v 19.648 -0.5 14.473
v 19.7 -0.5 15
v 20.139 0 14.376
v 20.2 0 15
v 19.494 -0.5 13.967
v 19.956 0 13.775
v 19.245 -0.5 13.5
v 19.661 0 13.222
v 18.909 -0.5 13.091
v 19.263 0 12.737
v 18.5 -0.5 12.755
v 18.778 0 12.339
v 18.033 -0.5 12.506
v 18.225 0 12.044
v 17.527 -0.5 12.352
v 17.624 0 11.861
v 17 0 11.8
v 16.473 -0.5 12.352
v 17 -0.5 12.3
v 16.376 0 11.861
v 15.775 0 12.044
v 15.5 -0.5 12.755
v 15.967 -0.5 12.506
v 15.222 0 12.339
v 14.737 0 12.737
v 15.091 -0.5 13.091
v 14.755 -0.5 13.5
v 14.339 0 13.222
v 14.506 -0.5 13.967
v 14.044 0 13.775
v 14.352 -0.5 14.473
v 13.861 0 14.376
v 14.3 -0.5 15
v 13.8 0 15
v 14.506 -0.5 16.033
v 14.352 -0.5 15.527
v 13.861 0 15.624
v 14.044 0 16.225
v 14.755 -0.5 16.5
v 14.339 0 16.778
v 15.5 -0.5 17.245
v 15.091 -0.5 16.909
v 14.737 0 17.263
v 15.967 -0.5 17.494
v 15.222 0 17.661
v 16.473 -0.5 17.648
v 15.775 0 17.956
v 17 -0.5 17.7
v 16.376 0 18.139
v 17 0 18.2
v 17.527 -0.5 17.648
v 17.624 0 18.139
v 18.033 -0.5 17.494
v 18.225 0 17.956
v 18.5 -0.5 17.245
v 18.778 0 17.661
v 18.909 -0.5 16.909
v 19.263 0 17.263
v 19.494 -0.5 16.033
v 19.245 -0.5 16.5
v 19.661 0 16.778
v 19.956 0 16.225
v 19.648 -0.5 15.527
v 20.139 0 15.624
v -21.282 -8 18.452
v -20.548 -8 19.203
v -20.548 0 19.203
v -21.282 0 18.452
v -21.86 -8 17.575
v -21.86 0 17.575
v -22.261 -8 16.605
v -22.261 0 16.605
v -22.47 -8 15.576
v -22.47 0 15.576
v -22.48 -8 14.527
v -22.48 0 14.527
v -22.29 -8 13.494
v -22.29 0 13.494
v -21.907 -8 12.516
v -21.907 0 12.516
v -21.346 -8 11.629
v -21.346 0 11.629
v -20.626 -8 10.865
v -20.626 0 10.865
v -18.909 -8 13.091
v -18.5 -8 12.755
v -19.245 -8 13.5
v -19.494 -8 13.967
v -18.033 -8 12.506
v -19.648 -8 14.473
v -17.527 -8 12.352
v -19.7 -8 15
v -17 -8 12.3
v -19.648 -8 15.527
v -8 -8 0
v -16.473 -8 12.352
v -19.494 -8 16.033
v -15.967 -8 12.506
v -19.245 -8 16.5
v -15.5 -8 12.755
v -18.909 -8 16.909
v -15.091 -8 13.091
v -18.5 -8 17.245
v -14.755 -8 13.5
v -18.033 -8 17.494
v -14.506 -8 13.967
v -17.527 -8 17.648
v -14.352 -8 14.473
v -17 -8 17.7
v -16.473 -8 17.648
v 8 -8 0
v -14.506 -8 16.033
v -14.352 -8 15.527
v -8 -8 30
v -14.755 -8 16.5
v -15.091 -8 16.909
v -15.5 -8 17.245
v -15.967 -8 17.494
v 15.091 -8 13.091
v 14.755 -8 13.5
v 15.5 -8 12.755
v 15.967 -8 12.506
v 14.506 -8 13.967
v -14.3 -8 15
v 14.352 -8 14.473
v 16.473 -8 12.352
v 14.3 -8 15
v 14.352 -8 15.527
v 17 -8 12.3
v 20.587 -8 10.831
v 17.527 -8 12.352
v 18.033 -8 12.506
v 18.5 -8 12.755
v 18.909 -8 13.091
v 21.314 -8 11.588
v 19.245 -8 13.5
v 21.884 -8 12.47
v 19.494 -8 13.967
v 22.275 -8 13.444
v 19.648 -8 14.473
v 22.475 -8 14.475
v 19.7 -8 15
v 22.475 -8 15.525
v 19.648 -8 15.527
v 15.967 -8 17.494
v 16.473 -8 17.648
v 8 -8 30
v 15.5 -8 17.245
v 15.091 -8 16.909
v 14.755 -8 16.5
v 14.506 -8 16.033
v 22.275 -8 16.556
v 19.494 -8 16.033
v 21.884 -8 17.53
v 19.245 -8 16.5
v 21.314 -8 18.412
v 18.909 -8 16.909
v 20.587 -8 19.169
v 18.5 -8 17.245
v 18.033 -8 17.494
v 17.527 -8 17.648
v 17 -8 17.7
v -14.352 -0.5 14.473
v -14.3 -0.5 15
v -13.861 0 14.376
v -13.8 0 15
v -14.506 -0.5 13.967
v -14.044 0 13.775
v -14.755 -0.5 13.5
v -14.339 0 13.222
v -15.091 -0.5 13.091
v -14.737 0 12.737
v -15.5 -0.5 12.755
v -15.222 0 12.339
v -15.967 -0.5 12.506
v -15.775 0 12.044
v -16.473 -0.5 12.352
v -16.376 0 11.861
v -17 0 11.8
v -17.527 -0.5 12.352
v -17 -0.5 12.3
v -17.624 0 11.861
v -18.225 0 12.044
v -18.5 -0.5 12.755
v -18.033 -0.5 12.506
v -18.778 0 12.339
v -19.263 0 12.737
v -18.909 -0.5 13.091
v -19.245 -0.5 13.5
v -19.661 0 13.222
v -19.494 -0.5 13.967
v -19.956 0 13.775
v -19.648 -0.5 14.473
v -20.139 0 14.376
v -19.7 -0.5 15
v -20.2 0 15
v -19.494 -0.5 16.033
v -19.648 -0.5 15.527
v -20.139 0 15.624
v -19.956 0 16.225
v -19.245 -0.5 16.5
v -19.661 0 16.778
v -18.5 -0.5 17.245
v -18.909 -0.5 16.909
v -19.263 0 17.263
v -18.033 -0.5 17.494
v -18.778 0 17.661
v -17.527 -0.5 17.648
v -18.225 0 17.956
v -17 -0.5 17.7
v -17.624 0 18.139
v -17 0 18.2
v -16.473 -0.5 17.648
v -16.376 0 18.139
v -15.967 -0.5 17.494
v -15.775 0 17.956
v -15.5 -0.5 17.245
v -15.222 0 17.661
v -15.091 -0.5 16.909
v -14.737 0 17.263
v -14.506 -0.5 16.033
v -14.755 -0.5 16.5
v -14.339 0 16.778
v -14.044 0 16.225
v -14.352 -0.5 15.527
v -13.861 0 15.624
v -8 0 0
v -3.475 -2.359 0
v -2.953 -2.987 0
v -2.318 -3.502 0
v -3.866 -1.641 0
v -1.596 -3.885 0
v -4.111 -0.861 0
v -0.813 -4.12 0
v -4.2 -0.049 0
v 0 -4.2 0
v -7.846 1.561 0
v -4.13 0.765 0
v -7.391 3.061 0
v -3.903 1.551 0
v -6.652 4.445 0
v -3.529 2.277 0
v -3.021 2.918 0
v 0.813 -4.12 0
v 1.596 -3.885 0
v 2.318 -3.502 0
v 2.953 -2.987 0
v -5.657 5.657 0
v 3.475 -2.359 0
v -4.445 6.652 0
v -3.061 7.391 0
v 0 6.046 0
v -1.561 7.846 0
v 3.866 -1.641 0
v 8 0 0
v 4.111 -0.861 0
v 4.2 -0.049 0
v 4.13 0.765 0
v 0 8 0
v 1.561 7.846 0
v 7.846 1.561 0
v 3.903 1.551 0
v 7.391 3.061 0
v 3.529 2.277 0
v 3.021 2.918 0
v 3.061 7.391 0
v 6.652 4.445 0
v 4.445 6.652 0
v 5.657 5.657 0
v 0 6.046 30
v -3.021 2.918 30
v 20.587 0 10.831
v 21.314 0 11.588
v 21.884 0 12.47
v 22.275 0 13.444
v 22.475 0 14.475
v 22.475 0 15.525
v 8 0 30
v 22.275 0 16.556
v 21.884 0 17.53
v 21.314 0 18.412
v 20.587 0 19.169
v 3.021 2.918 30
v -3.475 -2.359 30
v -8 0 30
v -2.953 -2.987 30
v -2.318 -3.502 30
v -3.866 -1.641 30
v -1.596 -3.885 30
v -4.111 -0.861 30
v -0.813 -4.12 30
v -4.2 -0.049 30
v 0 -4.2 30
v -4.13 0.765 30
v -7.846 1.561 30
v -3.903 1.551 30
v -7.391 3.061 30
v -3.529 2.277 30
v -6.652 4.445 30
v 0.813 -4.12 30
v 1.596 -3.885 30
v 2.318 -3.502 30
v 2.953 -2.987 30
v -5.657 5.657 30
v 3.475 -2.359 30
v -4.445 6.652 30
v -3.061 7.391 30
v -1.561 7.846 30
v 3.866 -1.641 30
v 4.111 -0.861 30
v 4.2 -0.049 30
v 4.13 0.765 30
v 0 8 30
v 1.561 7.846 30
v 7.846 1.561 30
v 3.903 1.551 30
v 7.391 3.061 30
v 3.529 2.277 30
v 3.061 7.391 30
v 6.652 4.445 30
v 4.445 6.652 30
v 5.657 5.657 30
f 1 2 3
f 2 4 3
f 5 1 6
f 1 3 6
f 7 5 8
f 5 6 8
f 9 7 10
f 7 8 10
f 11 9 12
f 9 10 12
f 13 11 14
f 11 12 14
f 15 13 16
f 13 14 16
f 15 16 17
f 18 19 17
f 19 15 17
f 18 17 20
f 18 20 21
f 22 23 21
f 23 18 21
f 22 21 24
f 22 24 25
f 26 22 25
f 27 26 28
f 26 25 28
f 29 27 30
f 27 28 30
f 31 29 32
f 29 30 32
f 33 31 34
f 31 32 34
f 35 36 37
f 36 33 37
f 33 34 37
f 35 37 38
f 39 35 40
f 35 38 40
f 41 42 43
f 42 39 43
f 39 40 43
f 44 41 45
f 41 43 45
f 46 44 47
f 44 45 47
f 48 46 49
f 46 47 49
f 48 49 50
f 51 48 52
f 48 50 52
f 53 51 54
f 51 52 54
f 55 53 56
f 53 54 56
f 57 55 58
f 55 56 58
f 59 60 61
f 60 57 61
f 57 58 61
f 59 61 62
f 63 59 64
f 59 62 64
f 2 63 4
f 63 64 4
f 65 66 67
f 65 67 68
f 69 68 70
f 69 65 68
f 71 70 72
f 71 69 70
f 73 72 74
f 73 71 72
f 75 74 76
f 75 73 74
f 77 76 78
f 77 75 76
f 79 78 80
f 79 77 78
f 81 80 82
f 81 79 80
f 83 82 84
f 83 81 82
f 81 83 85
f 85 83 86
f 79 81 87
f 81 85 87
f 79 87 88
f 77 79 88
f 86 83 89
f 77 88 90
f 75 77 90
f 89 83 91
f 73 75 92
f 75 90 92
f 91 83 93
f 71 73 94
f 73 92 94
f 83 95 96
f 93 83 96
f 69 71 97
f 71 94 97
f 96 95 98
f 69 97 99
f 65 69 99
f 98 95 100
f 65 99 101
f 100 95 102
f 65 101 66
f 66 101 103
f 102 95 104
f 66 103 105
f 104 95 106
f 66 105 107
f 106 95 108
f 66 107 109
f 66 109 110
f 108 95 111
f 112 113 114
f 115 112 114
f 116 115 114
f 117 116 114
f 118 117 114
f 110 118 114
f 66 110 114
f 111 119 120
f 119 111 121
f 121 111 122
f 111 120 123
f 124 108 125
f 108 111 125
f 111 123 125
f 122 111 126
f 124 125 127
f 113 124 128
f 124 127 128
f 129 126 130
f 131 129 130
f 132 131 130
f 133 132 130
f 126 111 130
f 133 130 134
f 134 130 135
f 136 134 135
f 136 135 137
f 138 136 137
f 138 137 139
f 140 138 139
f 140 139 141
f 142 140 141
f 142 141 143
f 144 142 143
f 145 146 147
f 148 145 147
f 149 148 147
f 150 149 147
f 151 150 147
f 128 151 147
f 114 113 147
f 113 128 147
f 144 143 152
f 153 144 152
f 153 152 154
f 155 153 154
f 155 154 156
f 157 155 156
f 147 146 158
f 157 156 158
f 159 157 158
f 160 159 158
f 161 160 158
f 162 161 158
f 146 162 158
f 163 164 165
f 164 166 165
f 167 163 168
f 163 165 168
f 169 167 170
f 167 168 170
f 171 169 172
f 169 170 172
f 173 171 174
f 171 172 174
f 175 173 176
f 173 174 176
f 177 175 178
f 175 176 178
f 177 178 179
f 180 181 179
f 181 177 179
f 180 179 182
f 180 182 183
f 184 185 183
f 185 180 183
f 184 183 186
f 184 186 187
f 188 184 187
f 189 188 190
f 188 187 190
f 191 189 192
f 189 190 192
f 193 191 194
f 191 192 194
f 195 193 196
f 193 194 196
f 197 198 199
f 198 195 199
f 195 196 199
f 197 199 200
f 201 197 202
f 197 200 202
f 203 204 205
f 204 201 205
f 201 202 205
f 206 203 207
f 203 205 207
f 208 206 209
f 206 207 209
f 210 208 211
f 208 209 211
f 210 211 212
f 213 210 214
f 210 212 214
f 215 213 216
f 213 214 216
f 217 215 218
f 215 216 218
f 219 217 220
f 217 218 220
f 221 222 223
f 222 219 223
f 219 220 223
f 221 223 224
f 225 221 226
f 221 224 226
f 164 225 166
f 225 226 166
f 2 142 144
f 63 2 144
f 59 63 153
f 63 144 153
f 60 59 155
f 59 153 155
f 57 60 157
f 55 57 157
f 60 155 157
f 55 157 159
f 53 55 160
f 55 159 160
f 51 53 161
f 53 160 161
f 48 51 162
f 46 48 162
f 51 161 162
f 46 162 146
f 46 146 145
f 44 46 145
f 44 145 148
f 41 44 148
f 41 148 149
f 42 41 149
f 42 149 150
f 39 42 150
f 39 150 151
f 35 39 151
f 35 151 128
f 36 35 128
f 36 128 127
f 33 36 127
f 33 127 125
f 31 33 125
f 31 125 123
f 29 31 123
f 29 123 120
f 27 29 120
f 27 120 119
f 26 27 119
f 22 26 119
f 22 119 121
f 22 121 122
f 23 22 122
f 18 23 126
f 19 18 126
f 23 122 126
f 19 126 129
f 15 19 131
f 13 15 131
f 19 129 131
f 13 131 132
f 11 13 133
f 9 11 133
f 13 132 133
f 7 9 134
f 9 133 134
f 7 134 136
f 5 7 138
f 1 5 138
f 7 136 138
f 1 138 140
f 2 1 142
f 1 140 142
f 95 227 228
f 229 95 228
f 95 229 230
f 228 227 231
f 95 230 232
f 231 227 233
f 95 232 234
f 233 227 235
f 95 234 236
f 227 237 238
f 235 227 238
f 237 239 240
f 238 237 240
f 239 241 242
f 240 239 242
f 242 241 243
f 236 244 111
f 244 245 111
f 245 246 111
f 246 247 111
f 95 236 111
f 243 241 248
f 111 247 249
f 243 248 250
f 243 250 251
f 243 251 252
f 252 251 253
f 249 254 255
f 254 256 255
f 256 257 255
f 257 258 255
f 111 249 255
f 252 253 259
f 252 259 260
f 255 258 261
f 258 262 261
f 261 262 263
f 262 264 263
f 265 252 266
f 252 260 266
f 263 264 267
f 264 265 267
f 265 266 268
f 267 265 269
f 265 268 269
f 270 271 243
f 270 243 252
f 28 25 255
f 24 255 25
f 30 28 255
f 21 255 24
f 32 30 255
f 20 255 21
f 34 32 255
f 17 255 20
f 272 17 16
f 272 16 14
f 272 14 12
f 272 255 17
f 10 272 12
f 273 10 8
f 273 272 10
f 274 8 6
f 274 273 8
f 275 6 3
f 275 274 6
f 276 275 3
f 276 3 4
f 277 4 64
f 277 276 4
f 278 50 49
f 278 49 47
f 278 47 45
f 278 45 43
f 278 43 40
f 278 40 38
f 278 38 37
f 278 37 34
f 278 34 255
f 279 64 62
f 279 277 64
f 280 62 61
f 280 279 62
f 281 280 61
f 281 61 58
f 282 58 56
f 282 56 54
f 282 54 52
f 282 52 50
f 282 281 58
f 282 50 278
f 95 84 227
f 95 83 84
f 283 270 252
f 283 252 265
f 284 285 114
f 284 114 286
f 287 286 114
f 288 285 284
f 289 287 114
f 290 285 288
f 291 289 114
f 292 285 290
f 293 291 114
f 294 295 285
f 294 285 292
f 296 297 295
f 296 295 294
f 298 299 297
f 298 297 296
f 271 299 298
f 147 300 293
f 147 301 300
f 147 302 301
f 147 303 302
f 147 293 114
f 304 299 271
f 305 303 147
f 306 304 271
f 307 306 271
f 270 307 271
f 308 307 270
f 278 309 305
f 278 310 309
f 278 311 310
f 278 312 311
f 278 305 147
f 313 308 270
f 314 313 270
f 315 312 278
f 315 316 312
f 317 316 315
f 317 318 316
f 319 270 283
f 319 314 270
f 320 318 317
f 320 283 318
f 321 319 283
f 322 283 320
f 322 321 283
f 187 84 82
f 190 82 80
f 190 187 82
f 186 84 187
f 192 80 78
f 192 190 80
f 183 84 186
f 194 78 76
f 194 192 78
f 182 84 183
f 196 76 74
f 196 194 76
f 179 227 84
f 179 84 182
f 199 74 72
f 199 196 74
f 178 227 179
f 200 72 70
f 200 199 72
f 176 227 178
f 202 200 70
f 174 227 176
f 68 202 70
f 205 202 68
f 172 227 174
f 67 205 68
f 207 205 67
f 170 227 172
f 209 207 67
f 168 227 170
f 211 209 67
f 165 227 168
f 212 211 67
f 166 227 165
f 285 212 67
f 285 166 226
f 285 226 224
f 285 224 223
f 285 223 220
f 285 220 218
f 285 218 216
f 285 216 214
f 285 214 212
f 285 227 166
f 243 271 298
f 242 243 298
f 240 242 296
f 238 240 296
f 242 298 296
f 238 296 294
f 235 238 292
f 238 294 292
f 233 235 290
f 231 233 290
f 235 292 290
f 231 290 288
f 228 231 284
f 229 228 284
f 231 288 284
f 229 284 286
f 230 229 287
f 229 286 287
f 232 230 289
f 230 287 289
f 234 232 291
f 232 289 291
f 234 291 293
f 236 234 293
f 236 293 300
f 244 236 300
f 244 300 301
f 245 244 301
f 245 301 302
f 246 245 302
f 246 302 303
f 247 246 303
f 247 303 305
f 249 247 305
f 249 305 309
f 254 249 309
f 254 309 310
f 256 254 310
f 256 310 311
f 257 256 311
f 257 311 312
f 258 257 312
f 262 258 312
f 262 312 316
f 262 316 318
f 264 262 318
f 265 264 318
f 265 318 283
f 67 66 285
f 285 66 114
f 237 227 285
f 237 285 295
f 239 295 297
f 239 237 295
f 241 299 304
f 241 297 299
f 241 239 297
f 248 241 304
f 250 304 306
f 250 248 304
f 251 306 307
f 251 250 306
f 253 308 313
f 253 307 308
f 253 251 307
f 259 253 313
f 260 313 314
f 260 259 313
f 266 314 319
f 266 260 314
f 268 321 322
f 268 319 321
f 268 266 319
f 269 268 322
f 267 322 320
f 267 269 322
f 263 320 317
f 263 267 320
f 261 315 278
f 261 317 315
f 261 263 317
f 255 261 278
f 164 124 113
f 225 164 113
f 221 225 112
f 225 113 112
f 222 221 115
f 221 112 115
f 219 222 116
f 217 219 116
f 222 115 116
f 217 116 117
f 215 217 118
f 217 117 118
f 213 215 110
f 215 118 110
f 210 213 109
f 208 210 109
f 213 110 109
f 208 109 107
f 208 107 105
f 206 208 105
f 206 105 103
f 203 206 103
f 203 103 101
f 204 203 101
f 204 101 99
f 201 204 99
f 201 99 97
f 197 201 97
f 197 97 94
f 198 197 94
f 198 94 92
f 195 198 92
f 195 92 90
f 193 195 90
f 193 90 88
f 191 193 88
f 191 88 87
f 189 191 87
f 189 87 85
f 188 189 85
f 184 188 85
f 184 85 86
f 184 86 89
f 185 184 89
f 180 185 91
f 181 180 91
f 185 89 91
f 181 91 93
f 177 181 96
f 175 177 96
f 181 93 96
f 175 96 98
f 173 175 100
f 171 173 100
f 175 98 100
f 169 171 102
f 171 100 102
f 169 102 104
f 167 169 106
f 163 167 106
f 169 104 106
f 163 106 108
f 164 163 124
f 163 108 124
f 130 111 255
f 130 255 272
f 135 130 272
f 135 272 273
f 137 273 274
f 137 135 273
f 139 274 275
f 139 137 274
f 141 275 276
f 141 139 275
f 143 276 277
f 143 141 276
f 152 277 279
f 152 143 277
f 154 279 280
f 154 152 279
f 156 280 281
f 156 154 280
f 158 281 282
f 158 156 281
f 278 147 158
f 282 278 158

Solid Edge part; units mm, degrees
sketch "Sketch1" plane through (0, 0, 0) normal (0, 0, 1) x (1, 0, 0)
  circle A0 centre (0, 0) radius 4.1
  circle A1 centre (0, 0) radius 8
extrude "Protrusion1" add sketch "Sketch1" along normal blind 30
sketch "Sketch2" plane through (0, -8, 0) normal (0, -1, 0) x (1, 0, 0)
  arc A0 (-20.6265, 10.8649) -> (-20.548, 19.2026) centre (-17, 15) cw
  line L0 (-20.548, 19.2026) -> (-8, 30)
  line L1 (-8, 30) -> (8, 30)
  line L2 (8, 30) -> (20.5873, 19.1691)
  arc A1 (20.5873, 10.8309) -> (20.5873, 19.1691) centre (17, 15) ccw
  line L3 (8, 0) -> (20.5873, 10.8309)
  line L4 (8, 0) -> (-8, 0)
  line L5 (-20.6265, 10.8649) -> (-8, 0)
  circle A2 centre (-17, 15) radius 2.7
  circle A3 centre (17, 15) radius 2.7
  dimension "D1" = 17
extrude "Protrusion2" add sketch "Sketch2" against normal up to vertex (8 mm away)
sketch "Sketch3" plane through (0, 0, 30) normal (0, 0, 1) x (0, 1, 0)
  circle A0 centre (0, 0) radius 4.2
extrude "Cutout1" cut sketch "Sketch3" against normal through all
sketch "Sketch4" plane through (0, 0, 0) normal (0, 0, -1) x (-1, 0, 0)
  line L0 (0, 0) -> (3.0212, 2.9176)
  line L1 (3.0212, 2.9176) -> (0, 6.0461)
  line L2 (0, 6.0461) -> (-3.0212, 2.9176)
  line L3 (-3.0212, 2.9176) -> (0, 0)
extrude "Cutout2" cut sketch "Sketch4" against normal through all
chamfer "Chamfer_1" distance 0.5 angle 45 2 edges at (14.3, 0, 15) (-19.7, 0, 15)
